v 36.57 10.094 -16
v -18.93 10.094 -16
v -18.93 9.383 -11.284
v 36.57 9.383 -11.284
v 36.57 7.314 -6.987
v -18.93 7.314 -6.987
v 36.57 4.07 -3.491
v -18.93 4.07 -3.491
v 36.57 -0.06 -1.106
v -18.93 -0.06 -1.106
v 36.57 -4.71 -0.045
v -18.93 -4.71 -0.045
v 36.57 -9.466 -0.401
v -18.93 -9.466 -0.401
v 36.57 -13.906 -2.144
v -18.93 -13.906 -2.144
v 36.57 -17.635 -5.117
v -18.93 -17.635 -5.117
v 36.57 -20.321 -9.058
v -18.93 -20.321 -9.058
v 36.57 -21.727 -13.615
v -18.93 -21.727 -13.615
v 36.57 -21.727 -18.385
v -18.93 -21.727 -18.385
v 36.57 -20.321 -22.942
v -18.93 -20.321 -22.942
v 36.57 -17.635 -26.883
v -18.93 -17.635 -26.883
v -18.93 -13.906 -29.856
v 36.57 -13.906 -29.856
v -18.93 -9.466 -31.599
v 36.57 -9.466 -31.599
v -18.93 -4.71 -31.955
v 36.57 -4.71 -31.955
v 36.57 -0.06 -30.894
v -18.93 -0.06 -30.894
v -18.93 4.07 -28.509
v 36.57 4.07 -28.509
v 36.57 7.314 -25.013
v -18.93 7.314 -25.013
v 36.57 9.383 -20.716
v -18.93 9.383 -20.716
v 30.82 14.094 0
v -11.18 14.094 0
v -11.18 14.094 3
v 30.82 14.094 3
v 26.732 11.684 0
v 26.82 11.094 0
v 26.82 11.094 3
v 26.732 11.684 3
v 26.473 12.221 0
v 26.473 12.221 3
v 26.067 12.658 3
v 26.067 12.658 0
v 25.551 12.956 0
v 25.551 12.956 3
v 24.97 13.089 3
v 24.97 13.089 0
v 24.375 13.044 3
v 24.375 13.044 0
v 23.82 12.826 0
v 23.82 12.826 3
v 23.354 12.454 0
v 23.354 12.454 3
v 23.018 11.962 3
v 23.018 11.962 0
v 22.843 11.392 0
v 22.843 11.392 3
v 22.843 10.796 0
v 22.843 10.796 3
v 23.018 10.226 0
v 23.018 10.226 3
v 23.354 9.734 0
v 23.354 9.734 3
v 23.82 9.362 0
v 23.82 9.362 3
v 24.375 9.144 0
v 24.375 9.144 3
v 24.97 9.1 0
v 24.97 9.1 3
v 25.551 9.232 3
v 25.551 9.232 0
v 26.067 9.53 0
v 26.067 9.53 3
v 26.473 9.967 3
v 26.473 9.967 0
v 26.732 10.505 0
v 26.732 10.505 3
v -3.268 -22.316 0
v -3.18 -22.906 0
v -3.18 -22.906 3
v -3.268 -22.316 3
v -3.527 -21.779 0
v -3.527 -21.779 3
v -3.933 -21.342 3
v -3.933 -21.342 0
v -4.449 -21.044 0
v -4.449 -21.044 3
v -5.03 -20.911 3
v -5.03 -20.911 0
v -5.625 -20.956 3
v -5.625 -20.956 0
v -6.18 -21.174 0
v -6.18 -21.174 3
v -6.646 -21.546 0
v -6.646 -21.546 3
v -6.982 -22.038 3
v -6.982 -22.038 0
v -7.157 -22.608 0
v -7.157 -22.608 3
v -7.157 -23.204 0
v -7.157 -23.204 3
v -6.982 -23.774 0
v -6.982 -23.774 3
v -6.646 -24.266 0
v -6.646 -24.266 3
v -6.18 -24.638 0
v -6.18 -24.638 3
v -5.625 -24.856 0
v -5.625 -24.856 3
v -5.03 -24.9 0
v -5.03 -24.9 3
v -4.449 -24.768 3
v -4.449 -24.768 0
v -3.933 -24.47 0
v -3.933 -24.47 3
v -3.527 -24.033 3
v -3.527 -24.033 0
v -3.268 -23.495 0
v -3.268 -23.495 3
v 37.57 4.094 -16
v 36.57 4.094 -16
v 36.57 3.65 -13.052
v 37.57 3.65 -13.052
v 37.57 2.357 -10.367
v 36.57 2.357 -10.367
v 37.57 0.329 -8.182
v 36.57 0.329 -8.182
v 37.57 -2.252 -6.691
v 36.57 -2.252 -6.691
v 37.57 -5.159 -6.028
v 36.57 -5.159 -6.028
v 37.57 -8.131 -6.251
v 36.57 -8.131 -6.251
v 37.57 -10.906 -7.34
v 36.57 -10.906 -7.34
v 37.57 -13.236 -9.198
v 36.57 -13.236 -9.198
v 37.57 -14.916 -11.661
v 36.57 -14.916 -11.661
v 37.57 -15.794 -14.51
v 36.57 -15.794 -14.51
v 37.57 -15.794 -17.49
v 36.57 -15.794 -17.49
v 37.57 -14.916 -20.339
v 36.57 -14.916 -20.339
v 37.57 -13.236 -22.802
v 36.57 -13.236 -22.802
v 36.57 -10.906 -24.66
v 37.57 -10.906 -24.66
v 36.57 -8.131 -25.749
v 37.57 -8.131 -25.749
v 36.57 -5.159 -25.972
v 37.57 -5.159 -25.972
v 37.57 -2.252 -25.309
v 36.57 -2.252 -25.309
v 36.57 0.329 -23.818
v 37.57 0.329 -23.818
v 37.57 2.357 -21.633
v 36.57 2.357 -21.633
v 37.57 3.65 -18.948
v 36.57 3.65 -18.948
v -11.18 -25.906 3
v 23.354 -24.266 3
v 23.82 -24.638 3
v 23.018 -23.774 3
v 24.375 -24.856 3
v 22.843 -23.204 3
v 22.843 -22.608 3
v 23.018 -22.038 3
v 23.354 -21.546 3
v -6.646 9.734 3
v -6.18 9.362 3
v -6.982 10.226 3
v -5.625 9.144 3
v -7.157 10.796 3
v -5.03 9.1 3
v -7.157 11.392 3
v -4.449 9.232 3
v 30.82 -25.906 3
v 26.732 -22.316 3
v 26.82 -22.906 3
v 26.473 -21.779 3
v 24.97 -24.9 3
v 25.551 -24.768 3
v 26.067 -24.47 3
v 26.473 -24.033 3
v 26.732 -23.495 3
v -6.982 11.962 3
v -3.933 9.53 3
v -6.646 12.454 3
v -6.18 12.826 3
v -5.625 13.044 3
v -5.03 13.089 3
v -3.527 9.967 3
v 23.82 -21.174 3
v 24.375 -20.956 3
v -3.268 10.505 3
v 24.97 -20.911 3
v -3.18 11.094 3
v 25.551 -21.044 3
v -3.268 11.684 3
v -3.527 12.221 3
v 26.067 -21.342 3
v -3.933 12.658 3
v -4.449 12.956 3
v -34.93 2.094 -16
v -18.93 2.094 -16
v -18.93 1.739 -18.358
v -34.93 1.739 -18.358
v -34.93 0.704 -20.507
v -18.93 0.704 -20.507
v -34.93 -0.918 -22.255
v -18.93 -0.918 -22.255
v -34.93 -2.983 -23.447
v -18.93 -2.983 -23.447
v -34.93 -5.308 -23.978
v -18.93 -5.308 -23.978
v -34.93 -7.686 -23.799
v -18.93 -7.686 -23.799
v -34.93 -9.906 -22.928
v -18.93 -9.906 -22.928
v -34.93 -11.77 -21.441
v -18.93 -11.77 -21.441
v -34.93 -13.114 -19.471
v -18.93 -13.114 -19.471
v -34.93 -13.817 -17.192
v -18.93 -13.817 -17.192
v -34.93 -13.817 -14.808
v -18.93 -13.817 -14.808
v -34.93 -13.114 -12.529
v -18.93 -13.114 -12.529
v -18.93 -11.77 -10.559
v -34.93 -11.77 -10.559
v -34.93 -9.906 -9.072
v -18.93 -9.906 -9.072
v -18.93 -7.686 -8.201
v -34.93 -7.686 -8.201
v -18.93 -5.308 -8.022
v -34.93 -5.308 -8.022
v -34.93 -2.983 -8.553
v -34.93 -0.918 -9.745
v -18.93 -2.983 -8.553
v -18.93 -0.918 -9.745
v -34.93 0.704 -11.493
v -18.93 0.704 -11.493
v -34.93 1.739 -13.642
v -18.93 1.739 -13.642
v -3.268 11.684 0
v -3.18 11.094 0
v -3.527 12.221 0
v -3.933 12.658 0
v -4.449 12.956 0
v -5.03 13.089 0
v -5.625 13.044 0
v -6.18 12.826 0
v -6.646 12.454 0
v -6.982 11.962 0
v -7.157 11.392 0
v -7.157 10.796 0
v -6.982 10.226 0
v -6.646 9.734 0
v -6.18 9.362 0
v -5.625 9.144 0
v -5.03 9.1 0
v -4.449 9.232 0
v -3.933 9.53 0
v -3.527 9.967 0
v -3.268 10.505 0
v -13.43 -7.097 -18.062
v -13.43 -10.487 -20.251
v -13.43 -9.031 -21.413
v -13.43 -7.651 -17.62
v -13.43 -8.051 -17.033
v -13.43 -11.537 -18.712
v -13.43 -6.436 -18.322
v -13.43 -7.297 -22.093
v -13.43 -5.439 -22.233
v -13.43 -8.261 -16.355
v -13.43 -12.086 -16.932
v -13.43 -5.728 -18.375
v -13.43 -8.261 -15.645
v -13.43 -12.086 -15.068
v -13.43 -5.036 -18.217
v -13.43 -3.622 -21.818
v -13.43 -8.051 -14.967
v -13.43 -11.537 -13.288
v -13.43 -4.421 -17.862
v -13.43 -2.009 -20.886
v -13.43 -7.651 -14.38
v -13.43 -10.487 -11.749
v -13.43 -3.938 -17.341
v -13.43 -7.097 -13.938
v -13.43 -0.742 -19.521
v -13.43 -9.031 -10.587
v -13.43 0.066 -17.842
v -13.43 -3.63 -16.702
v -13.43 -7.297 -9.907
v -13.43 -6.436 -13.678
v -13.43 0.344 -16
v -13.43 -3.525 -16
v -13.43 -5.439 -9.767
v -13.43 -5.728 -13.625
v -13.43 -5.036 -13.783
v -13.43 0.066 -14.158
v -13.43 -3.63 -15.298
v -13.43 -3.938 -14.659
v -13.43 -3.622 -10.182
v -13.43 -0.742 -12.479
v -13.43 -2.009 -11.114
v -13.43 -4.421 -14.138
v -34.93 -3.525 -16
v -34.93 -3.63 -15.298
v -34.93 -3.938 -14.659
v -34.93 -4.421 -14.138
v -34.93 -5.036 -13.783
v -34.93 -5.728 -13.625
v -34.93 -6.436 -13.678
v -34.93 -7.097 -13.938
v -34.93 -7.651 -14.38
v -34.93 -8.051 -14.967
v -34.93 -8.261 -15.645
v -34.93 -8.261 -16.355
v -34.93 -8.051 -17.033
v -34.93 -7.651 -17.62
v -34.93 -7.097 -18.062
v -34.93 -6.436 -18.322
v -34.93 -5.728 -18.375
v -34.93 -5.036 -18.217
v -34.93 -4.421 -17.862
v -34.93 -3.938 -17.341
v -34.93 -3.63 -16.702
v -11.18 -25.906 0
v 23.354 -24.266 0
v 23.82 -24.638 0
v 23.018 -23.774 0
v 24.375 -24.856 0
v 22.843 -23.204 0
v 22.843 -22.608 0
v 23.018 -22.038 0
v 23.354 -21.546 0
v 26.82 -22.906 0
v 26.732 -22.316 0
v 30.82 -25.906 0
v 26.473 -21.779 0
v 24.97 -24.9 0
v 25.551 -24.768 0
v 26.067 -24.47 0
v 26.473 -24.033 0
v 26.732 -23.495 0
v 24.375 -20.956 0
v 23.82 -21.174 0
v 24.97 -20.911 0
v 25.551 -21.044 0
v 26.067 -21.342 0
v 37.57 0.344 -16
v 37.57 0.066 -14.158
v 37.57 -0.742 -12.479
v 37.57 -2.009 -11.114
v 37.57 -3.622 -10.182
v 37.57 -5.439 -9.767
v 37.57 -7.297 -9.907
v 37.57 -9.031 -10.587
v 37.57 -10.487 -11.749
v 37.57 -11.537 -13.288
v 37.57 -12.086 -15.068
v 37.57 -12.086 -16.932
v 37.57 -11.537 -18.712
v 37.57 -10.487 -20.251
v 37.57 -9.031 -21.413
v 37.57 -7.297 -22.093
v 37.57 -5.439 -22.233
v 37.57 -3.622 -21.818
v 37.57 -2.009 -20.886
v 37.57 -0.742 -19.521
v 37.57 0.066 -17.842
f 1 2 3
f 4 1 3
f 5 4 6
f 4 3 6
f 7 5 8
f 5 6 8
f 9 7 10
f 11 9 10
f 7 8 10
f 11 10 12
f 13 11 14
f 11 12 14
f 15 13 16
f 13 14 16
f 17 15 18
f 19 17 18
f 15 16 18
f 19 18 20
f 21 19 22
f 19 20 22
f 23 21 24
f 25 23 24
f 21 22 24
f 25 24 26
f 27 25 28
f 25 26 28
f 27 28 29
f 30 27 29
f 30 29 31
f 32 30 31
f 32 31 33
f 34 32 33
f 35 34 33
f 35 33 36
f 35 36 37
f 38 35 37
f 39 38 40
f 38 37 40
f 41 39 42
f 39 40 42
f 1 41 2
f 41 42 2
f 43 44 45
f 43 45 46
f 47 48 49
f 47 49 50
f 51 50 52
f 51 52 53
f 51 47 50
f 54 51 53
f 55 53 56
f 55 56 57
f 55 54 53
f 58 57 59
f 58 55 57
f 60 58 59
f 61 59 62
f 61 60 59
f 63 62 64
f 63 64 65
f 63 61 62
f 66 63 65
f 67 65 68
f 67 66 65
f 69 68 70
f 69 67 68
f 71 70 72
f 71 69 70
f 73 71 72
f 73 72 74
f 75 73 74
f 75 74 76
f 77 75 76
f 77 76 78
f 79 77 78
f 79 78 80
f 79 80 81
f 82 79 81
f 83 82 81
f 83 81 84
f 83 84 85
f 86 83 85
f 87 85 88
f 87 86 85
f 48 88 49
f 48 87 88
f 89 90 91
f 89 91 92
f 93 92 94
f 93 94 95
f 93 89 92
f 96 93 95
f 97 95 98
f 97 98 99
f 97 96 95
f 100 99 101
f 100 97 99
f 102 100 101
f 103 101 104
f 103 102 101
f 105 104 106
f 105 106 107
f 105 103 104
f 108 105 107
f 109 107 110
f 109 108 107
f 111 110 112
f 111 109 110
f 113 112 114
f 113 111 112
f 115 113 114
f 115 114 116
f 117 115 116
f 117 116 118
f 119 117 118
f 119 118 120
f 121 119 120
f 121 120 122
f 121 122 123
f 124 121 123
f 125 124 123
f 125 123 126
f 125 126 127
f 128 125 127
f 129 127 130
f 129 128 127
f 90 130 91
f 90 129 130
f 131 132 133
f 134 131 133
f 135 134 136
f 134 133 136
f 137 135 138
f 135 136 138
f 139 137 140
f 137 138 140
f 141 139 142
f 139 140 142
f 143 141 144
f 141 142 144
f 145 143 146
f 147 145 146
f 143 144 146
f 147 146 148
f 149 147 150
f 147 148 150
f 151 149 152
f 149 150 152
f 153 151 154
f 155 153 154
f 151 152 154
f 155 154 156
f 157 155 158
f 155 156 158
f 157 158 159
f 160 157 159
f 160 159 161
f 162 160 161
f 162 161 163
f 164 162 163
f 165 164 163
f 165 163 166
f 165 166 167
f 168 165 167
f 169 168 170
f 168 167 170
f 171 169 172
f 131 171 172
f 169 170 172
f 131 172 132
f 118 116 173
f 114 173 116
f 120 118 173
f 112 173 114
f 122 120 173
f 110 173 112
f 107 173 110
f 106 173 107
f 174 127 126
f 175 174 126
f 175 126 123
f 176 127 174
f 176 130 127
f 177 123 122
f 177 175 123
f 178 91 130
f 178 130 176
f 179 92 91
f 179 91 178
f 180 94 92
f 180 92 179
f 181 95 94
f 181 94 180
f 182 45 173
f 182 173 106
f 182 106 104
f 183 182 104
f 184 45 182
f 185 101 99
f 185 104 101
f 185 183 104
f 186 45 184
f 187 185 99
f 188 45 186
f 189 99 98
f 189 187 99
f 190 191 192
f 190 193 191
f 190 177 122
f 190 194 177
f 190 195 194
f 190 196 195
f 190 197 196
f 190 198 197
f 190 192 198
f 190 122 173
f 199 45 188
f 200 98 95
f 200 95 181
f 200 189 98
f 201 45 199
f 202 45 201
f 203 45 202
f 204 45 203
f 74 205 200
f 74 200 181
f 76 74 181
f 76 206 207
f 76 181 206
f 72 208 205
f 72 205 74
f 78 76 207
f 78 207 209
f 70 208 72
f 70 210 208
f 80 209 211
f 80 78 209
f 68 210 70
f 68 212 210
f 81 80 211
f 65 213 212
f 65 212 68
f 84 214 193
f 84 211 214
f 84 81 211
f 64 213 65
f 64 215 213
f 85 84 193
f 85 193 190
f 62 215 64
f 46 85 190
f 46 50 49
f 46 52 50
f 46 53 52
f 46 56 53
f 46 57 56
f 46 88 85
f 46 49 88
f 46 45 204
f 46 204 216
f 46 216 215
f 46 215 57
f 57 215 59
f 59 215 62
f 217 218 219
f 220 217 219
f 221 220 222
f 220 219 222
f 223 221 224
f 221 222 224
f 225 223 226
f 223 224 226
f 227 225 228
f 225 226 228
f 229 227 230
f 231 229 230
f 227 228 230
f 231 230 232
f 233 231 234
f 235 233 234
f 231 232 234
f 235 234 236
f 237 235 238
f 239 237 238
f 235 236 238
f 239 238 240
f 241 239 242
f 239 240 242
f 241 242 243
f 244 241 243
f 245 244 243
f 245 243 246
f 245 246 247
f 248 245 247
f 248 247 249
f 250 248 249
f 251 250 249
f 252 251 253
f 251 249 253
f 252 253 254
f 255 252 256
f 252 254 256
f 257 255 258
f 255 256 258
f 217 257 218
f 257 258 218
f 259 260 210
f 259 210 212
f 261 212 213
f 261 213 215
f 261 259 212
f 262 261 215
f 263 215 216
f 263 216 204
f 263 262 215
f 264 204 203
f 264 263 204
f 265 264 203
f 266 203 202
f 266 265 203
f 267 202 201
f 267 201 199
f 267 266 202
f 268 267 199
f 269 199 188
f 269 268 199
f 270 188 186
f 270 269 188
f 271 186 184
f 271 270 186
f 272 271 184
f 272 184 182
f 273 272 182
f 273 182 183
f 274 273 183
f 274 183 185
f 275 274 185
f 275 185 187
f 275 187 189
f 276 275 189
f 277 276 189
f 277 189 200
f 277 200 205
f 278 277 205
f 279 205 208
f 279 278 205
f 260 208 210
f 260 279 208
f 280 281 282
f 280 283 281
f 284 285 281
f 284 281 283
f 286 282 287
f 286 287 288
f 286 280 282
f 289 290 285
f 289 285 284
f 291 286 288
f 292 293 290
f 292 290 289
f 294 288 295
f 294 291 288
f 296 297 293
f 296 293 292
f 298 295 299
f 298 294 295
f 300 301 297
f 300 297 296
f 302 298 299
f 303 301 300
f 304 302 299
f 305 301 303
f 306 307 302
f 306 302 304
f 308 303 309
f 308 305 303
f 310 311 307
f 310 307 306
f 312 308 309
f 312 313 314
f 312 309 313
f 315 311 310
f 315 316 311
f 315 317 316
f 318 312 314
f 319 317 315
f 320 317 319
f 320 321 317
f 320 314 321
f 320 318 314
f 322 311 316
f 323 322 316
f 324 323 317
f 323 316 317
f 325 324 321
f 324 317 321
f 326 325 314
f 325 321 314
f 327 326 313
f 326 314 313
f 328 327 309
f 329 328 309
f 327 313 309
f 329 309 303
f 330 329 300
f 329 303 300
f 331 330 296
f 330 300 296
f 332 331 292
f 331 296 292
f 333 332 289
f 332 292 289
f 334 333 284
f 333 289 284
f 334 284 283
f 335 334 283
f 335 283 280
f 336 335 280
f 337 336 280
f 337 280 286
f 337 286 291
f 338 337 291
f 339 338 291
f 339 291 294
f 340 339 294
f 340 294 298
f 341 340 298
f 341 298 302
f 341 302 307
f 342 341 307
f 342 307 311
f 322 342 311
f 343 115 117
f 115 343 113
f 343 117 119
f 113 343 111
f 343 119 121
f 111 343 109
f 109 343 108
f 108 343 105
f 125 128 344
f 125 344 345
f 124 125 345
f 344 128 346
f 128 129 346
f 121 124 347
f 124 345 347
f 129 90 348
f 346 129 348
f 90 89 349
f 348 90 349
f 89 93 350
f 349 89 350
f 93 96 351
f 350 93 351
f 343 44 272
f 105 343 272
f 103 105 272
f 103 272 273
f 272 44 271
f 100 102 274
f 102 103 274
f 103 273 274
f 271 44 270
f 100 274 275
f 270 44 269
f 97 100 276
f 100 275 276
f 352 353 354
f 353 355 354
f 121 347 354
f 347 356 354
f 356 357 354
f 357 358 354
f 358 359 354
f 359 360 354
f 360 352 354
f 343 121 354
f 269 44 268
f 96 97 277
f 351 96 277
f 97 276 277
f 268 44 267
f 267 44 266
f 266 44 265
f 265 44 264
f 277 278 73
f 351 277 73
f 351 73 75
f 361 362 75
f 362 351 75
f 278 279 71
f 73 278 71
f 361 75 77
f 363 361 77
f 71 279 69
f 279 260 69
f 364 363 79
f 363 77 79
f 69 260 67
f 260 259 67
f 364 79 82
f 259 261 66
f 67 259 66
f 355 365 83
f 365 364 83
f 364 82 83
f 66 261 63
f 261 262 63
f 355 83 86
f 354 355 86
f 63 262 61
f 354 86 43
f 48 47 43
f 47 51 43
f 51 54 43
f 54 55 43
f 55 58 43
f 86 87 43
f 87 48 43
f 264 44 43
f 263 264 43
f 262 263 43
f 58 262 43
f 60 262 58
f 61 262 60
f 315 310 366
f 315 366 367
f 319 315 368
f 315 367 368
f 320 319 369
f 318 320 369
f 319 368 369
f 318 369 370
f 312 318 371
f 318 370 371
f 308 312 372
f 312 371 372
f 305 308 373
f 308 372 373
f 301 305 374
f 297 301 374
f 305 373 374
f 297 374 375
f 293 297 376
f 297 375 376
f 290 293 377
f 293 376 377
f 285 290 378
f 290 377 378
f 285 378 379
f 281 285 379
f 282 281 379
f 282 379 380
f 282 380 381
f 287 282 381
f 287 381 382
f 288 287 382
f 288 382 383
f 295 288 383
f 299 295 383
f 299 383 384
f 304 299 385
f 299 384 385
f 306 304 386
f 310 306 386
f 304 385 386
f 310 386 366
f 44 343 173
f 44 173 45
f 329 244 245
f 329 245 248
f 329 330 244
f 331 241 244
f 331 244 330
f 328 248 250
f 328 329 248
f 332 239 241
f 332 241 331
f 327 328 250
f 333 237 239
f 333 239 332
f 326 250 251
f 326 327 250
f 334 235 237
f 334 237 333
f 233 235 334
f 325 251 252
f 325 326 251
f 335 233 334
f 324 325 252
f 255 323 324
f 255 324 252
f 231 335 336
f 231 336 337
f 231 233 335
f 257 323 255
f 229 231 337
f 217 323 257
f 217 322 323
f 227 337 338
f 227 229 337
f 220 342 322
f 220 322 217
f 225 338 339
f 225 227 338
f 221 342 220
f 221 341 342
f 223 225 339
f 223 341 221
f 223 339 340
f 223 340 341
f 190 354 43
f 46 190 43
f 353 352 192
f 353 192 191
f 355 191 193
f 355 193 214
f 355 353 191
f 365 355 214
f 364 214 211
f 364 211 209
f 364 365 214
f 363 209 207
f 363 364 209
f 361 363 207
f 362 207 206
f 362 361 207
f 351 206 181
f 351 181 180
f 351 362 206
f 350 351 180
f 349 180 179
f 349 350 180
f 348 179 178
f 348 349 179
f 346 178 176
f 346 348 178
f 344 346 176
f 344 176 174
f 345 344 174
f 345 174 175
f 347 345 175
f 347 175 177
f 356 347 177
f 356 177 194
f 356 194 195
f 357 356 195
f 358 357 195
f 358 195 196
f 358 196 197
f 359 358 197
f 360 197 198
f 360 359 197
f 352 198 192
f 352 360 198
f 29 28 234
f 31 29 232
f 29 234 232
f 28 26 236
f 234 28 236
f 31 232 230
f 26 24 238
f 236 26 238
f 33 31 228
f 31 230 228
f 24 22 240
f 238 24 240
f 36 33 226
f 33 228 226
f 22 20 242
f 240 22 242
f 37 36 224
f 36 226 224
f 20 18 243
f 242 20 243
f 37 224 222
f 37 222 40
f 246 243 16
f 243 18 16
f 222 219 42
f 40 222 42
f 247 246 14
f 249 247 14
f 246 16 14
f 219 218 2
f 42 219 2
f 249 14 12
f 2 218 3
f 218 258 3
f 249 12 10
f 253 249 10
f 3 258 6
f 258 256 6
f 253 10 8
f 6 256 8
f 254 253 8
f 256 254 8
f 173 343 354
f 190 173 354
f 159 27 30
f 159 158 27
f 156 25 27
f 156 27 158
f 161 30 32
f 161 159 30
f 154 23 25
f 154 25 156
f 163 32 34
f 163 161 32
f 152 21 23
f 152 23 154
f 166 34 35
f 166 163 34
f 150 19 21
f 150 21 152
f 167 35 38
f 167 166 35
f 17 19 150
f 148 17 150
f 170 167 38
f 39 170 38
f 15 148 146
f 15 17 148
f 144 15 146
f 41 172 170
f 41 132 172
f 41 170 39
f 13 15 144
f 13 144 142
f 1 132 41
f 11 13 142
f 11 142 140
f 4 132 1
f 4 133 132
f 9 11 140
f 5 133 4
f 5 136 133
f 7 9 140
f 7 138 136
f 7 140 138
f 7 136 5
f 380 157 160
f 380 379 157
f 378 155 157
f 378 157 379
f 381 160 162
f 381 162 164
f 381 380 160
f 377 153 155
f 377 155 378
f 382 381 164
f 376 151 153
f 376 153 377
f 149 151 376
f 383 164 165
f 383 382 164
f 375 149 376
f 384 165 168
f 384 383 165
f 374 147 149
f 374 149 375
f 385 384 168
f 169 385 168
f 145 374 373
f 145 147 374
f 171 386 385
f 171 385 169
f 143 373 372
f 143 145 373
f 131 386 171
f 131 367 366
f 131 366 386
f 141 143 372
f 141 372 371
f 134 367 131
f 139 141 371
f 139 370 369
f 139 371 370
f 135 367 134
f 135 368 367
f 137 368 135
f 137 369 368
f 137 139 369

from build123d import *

# Parameters (mm, degrees)
SKETCH1_W                = 42
SKETCH1_H                = 40
SKETCH1_R                = 2
BOSS_EXTRUDE1_DEPTH      = 3
BOSS_EXTRUDE2_DEPTH      = 27.75
BOSS_EXTRUDE2_DEPTH_BACK = 27.75
SKETCH2_R                = 16
SKETCH3_R                = 8
BOSS_EXTRUDE3_DEPTH      = 16
SKETCH4_R                = 10
BOSS_EXTRUDE4_DEPTH      = 1
SKETCH5_R                = 6.25
CUT_EXTRUDE1_DEPTH       = 51
SKETCH6_R                = 2.38125
CUT_EXTRUDE2_DEPTH       = 66.54475261


with BuildPart() as part:
    # Sketch1 → Boss-Extrude1 (new body)
    with BuildSketch(Plane.XY):
        with Locations((9.820372205, -5.905879539)):
            Rectangle(SKETCH1_W, SKETCH1_H)
        with Locations((-5.179627795, 11.094120461)):
            Circle(SKETCH1_R, mode=Mode.SUBTRACT)
        with Locations((-5.179627795, -22.905879539)):
            Circle(SKETCH1_R, mode=Mode.SUBTRACT)
        with Locations((24.820372205, 11.094120461)):
            Circle(SKETCH1_R, mode=Mode.SUBTRACT)
        with Locations((24.820372205, -22.905879539)):
            Circle(SKETCH1_R, mode=Mode.SUBTRACT)
    extrude(amount=BOSS_EXTRUDE1_DEPTH)


with BuildPart() as body_2:
    # Sketch2 → Boss-Extrude2 (new, two sides: drawn at the far end of the back side and taken through both)
    with BuildSketch(Plane(origin=(8.820372205, 0, 0), x_dir=(0, 0, -1), z_dir=(1, 0, 0)).offset(-BOSS_EXTRUDE2_DEPTH_BACK)):
        with Locations(Location((16, -5.905879539, 0), (0, 0, 90))):
            Circle(SKETCH2_R)
    extrude(amount=BOSS_EXTRUDE2_DEPTH + BOSS_EXTRUDE2_DEPTH_BACK)

    # Sketch3 → Boss-Extrude3 (add)
    with BuildSketch(Plane.ZY.offset(18.929627795)):
        with Locations(Location((-16, -5.905879539, 0), (0, 0, 90))):
            Circle(SKETCH3_R)
    extrude(amount=BOSS_EXTRUDE3_DEPTH)

    # Sketch4 → Boss-Extrude4 (add)
    with BuildSketch(Plane(origin=(36.570372205, 0, 0), x_dir=(0, 0, -1), z_dir=(1, 0, 0))):
        with Locations(Location((16, -5.905879539, 0), (0, 0, 90))):
            Circle(SKETCH4_R)
    extrude(amount=BOSS_EXTRUDE4_DEPTH)

    # Sketch5 → Cut-Extrude1 (cut)
    with BuildSketch(Plane(origin=(37.570372205, 0, 0), x_dir=(0, 0, -1), z_dir=(1, 0, 0))):
        with Locations(Location((16, -5.905879539, 0), (0, 0, 90))):
            Circle(SKETCH5_R)
    extrude(amount=-CUT_EXTRUDE1_DEPTH, mode=Mode.SUBTRACT)

    # Sketch6 → Cut-Extrude2 (cut, through all)
    with BuildSketch(Plane(origin=(-13.429627795, 0, 0), x_dir=(0, 0, -1), z_dir=(1, 0, 0))):
        with Locations(Location((16, -5.905879539, 0), (0, 0, 90))):
            Circle(SKETCH6_R)
    extrude(amount=-CUT_EXTRUDE2_DEPTH, mode=Mode.SUBTRACT)


solid = Compound([part.part, body_2.part])
